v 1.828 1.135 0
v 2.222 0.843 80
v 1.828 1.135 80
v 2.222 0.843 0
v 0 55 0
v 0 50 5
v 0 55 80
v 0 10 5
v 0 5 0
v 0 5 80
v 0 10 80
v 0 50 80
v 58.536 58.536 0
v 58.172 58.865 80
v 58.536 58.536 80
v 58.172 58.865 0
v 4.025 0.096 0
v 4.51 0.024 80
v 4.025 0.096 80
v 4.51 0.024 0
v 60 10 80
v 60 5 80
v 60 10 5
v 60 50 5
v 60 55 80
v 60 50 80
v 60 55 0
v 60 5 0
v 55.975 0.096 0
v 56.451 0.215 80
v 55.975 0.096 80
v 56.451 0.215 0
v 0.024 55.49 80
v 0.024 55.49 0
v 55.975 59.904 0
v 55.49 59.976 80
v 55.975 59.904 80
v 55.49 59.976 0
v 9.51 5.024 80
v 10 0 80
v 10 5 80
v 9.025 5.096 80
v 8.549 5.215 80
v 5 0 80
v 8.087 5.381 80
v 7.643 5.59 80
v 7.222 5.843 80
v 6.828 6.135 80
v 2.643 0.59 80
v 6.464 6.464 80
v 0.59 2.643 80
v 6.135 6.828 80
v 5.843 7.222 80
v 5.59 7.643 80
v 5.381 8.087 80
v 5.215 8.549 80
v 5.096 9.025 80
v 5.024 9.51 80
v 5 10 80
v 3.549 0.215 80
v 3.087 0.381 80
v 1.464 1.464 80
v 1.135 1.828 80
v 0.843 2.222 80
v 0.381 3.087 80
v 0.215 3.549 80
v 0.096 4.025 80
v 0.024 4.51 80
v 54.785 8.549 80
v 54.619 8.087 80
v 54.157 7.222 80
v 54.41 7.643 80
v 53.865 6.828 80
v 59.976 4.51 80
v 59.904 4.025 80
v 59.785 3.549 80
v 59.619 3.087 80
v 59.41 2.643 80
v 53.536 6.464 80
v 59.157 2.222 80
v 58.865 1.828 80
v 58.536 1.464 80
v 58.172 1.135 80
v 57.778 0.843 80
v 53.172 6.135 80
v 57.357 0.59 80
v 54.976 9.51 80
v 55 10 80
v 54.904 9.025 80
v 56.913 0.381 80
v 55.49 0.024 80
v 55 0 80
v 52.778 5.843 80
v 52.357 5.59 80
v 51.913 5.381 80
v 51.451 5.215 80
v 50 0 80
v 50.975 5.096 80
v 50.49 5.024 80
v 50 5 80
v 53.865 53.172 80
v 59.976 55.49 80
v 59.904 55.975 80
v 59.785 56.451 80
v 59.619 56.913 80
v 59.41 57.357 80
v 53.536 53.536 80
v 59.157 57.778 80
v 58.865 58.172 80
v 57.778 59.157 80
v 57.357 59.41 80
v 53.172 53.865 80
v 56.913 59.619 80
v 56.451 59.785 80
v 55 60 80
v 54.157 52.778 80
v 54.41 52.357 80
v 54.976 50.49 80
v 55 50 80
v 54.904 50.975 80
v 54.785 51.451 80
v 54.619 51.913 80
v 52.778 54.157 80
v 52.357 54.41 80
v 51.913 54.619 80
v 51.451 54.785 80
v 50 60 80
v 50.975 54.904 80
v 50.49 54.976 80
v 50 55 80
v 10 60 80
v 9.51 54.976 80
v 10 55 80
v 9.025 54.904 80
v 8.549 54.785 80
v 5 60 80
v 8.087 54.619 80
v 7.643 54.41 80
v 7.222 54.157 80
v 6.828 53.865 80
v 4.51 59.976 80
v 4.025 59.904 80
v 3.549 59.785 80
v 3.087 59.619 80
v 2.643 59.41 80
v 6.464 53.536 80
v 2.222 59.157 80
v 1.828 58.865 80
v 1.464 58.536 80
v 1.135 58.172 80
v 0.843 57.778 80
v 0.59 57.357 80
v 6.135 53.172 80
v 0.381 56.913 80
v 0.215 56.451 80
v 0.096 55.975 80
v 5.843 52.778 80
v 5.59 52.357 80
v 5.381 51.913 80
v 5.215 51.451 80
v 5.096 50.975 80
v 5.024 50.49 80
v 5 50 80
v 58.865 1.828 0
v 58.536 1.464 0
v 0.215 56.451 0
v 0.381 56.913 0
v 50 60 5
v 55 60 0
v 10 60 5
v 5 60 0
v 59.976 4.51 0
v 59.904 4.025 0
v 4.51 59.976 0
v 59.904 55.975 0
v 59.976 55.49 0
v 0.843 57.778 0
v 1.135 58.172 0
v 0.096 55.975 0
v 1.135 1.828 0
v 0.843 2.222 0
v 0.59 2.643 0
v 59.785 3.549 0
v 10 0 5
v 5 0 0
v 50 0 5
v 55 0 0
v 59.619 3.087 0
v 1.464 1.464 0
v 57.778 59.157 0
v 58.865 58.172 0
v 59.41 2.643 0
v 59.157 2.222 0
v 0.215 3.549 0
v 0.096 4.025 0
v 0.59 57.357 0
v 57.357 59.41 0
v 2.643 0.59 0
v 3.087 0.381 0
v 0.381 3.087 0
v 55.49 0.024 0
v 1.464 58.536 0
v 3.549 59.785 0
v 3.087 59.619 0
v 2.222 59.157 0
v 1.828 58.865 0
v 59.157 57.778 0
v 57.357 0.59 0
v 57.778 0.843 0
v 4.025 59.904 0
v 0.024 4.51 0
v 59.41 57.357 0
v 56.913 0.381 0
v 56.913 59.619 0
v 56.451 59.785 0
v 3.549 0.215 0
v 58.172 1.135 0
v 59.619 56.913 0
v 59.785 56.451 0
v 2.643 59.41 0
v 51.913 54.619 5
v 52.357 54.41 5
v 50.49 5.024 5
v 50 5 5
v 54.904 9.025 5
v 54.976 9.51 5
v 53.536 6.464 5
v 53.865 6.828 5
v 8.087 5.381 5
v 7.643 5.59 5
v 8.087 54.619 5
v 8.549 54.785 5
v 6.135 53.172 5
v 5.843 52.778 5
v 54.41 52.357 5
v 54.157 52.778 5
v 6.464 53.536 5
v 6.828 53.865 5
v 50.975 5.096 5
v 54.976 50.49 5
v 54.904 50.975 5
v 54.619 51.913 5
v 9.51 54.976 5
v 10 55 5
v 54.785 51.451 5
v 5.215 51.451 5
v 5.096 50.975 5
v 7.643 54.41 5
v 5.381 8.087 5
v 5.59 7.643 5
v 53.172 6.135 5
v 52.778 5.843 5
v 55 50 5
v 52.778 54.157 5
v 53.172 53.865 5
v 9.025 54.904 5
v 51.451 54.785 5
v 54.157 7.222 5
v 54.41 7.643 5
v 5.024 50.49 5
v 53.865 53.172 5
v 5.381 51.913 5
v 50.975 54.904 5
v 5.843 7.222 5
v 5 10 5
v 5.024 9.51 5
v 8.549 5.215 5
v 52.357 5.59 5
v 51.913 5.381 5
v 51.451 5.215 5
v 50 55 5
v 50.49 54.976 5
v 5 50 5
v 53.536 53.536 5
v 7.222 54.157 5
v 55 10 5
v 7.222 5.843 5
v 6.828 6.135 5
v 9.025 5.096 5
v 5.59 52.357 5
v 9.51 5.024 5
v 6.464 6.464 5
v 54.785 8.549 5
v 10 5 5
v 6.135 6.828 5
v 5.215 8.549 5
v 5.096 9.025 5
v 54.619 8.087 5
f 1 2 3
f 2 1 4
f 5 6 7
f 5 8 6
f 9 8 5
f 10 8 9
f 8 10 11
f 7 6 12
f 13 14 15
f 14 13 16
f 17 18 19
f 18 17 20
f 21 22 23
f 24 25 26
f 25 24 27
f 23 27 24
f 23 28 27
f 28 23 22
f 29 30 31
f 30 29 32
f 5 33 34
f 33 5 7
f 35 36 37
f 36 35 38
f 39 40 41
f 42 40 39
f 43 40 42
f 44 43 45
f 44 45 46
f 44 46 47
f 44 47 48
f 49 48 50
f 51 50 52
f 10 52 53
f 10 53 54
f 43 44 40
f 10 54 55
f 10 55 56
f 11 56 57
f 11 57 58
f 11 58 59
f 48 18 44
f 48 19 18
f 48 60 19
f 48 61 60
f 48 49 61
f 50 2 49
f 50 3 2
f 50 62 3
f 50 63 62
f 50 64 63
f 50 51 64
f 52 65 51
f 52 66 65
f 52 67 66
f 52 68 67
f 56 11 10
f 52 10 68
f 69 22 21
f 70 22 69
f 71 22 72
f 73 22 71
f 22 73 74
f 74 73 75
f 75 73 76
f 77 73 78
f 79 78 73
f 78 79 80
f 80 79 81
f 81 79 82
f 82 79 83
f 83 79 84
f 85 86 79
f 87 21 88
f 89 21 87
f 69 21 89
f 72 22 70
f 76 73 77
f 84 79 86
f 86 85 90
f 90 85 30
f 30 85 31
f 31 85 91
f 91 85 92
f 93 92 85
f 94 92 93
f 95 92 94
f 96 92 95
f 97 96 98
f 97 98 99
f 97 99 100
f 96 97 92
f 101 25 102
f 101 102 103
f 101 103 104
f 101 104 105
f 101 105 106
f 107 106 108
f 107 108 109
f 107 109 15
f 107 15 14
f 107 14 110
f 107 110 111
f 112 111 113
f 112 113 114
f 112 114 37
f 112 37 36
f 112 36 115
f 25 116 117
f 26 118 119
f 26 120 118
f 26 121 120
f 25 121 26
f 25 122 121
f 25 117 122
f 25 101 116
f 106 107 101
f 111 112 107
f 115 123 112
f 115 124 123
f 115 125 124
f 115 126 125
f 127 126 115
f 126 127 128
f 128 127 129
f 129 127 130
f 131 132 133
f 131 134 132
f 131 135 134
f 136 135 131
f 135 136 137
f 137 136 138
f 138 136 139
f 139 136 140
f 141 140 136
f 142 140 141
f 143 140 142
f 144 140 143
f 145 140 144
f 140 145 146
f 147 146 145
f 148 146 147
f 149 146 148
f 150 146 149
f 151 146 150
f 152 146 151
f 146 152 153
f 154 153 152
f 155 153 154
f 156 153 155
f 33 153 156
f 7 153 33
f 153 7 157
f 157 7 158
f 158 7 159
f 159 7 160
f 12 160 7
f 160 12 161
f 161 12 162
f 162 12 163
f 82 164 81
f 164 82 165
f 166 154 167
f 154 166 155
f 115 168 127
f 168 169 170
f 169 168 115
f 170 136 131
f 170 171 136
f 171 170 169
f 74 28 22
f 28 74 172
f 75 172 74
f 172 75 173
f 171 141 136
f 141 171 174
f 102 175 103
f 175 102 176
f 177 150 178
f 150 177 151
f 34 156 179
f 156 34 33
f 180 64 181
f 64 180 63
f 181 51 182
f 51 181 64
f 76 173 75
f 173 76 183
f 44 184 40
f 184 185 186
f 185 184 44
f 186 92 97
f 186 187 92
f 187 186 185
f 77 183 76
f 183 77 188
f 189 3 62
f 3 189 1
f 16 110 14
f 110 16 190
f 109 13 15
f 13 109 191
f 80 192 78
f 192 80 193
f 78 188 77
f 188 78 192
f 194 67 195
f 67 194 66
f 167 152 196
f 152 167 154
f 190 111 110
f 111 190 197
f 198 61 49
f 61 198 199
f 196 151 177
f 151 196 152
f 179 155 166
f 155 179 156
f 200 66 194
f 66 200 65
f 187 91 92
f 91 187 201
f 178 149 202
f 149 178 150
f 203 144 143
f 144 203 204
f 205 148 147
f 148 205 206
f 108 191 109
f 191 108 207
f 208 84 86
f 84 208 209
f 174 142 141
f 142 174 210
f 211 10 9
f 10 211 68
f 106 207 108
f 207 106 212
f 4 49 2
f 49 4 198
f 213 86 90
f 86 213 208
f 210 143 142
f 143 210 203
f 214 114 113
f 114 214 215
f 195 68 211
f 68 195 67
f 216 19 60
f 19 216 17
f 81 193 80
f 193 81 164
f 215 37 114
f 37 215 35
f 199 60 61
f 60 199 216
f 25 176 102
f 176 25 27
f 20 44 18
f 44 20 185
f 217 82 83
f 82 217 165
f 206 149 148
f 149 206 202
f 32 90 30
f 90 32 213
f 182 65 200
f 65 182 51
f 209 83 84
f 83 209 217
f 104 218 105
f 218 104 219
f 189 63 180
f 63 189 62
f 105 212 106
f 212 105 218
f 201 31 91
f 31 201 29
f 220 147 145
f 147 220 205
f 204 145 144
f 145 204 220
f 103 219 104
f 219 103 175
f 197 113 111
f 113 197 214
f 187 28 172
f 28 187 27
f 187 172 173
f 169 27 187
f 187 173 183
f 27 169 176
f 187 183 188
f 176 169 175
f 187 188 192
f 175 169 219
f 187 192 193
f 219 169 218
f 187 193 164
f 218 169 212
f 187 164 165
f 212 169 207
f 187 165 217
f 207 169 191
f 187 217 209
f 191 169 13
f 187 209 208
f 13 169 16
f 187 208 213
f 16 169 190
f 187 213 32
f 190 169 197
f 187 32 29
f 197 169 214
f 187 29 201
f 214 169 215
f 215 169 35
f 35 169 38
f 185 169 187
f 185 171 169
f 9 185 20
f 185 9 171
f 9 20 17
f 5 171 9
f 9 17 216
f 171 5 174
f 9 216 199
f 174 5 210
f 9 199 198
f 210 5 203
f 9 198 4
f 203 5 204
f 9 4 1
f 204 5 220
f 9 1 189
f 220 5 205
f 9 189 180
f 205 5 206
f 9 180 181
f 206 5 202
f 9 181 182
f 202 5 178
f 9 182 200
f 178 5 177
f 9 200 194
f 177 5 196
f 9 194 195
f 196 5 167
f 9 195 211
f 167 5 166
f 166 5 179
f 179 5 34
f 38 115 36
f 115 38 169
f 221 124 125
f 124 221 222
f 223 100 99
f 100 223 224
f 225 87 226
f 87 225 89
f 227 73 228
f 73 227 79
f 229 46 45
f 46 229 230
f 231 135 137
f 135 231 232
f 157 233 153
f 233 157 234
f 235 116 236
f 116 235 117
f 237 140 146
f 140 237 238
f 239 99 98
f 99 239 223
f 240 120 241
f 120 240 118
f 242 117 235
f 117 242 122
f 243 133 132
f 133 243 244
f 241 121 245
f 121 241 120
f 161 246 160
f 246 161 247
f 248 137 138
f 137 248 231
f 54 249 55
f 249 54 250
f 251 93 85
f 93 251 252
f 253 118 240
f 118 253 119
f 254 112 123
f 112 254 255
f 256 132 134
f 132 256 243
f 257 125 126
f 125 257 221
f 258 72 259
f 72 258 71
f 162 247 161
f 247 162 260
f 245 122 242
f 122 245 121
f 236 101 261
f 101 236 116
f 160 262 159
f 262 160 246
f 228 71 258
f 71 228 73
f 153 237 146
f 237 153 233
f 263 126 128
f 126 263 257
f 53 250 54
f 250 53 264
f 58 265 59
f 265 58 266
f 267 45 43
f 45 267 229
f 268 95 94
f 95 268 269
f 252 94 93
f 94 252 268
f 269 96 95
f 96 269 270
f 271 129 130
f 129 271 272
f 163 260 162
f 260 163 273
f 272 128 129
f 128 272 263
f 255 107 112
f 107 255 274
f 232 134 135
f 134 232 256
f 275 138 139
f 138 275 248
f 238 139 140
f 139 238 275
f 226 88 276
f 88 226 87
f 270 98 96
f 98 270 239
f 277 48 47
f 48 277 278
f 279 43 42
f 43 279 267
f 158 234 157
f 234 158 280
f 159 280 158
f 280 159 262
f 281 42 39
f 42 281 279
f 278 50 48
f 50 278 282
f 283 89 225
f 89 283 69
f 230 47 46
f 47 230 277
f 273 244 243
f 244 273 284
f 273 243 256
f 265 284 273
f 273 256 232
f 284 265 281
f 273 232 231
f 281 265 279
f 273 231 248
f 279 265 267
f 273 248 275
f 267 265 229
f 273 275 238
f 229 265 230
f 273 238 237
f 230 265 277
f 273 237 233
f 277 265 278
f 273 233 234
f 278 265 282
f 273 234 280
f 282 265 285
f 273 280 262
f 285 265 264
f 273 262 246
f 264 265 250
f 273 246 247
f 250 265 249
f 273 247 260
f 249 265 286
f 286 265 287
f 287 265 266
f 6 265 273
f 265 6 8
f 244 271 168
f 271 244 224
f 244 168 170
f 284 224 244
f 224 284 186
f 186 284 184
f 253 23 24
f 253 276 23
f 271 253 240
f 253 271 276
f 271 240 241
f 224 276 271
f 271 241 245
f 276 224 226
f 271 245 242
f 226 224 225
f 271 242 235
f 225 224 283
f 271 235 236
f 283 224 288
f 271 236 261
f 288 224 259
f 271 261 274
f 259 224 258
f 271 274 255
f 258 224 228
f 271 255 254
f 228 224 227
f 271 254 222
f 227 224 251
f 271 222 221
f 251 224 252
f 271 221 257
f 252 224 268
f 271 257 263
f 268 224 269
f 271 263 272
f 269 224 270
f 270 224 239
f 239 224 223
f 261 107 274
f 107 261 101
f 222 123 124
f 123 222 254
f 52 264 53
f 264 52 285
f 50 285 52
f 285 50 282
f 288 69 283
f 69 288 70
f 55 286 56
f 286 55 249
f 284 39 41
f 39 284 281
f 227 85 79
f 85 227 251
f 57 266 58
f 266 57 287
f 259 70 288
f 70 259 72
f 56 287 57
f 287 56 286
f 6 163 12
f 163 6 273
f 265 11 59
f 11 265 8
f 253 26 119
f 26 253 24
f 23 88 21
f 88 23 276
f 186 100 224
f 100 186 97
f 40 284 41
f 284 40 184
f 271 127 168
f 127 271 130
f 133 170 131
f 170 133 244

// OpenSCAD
$fn=64;
module roundedcube(xdim,ydim,zdim,rdim){
    hull(){
        translate([rdim,rdim,0]) cylinder(h=zdim,r=rdim);
        translate([xdim-rdim,rdim,0]) cylinder(h=zdim,r=rdim);
        translate([rdim,ydim-rdim,0]) cylinder(h=zdim,r=rdim);
        translate([xdim-rdim,ydim-rdim,0]) cylinder(h=zdim,r=rdim);
    }
}

module baseShell(sideLength, height, cornerRadius, wallThickness, bottomThickness)
{
    difference() {
        roundedcube(sideLength,sideLength,height,cornerRadius);
        innerSideLength = sideLength - (wallThickness * 2);
        translate([wallThickness, wallThickness, bottomThickness])
            roundedcube(innerSideLength,innerSideLength,height,cornerRadius);
    }
}

epsilon = 0.001;
module baseShellCut(sideLength, height, cornerRadius, wallThickness, bottomThickness)
{
    difference() {
        baseShell(sideLength, height, cornerRadius, wallThickness, bottomThickness);
        straightWallSpan = sideLength - (cornerRadius * 4);
        translate([0-epsilon,cornerRadius*2,bottomThickness])
            scale([1+epsilon,1,1])
            cube([wallThickness,straightWallSpan,height]);
        translate([(sideLength-wallThickness)-epsilon,cornerRadius*2,bottomThickness])
            scale([1+epsilon,1,1])
            cube([wallThickness,straightWallSpan,height]);
        translate([cornerRadius*2,0-epsilon,bottomThickness])
            scale([1,1+epsilon,1])
            cube([straightWallSpan,wallThickness,height]);
        translate([cornerRadius*2,(sideLength-wallThickness)-epsilon,bottomThickness])
            scale([1,1+epsilon,1])
            cube([straightWallSpan,wallThickness,height]);
    }
}

module wallwithLinesImport(extrusionHeight)
{
    linear_extrude(height=extrusionHeight)
        translate([0,222,0])
        import(file="hex_wall_with_lines.dxf", layer="base");
}

module wallImport(extrusionHeight)
{
    linear_extrude(height=extrusionHeight)
        translate([0,222,0])
        import(file="hex_wall.dxf", layer="base");
}

module completeWall()
{
    wallImport(2.5);
    translate([0,0,2.5])
        wallwithLinesImport(0.5);
}

sideLength = 60;
height = 80;
cornerRadius = 5;
wallThickness = 5;
bottomThickness = 5;

baseShellCut(sideLength, height, cornerRadius, wallThickness, bottomThickness);

insertedWallThickess = 3;
insertedWallLength = 40;

translate([cornerRadius*2,insertedWallThickess,bottomThickness])
rotate([90,0,0])
completeWall();

translate([insertedWallThickess,(cornerRadius*2)+insertedWallLength,bottomThickness])
rotate([90,0,-90])
completeWall();

translate([sideLength-insertedWallThickess,(cornerRadius*2),bottomThickness])
rotate([90,0,90])
completeWall();

translate([insertedWallLength+(cornerRadius*2),sideLength-insertedWallThickess,bottomThickness])
rotate([90,0,-180])
completeWall();
